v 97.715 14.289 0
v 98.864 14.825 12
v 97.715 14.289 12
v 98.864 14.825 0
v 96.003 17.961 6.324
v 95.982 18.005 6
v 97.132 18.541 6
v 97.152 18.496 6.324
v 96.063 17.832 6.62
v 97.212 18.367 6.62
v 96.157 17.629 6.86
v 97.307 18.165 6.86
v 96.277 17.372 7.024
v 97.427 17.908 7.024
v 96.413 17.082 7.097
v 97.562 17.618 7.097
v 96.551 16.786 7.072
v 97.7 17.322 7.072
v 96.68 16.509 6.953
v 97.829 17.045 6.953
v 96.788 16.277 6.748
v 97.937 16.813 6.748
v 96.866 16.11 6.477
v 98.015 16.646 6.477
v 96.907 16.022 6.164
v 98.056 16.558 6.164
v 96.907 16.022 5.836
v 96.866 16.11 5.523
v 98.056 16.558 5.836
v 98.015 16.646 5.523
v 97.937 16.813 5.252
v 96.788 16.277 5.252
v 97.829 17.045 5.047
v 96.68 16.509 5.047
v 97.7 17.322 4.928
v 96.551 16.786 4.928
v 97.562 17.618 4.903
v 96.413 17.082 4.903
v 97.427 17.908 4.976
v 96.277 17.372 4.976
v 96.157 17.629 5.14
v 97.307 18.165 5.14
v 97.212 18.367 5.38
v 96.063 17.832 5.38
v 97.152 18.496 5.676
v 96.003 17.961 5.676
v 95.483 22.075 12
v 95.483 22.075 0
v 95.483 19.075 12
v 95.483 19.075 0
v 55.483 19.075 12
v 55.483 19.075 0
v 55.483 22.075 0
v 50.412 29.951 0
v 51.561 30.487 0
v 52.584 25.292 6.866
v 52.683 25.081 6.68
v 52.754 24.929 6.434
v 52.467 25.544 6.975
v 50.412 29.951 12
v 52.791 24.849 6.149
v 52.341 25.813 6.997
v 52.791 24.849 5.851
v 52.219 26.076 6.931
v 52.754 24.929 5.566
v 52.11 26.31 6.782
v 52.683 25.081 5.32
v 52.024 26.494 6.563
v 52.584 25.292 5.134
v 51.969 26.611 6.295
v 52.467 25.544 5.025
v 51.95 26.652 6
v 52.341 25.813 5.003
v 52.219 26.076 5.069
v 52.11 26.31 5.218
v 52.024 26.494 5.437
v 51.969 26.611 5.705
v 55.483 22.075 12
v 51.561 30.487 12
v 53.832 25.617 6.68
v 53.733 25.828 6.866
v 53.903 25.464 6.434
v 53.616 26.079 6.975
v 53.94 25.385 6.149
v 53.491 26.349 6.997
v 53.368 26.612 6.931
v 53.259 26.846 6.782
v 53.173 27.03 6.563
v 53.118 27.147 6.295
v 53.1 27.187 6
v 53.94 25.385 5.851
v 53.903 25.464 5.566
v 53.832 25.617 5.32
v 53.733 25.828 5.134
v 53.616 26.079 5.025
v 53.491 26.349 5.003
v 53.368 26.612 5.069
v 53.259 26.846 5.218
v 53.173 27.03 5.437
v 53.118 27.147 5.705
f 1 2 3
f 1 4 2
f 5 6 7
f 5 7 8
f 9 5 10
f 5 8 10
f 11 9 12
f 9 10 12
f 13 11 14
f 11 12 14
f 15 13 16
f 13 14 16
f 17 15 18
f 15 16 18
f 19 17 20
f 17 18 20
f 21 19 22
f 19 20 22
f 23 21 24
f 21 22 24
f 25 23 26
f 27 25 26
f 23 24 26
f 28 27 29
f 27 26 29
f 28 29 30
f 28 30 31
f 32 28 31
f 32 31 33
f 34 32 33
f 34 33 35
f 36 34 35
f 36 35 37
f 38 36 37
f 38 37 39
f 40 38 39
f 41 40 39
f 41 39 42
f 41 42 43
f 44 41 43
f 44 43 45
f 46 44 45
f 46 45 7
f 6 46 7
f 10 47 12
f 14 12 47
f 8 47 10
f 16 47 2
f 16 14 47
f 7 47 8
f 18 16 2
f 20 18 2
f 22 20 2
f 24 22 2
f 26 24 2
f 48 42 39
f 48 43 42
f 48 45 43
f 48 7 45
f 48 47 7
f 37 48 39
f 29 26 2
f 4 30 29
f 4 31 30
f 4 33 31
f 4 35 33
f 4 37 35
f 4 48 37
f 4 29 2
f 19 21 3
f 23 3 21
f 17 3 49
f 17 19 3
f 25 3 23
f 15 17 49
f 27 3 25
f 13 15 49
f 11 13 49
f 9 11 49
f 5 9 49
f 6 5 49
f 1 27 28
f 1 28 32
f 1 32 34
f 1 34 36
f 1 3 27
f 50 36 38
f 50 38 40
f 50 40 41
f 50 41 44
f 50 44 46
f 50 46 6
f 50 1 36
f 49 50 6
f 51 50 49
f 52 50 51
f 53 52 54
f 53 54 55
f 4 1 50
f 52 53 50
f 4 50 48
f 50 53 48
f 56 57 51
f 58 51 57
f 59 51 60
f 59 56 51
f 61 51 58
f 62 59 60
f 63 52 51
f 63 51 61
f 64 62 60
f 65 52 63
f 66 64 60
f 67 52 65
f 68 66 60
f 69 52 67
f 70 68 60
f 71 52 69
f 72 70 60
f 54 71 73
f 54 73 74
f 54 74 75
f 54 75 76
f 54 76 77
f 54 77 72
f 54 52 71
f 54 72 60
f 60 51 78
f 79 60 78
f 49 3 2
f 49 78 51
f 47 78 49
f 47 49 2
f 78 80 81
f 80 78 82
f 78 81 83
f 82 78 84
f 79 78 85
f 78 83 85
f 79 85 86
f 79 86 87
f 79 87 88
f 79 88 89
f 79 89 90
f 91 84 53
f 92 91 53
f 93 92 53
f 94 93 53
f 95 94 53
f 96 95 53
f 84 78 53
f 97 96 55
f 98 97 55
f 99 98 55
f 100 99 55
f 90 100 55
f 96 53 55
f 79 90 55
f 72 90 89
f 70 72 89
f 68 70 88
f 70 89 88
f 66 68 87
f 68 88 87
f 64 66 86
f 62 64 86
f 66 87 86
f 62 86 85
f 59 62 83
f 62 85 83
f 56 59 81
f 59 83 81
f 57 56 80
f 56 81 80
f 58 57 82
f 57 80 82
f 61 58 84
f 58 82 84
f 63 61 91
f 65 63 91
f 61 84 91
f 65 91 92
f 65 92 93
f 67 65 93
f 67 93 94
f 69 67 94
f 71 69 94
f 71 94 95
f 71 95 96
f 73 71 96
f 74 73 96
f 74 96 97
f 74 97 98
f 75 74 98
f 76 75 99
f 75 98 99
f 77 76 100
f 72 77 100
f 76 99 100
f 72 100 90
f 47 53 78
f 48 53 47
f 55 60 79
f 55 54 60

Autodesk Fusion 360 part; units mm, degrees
sketch "Sketch1" plane through (0, 0, 0) normal (0, 0, 1) x (1, 0, 0)
  line L0 (55.4833, 22.0753) -> (95.4833, 22.0753)
  line L1 (95.4833, 22.0753) -> (95.4833, 19.0753)
  line L2 (95.4833, 19.0753) -> (55.4833, 19.0753)
  line L3 (55.4833, 19.0753) -> (55.4833, 22.0753)
  line L4 (95.4833, 22.0753) -> (98.8643, 14.8248)
  line L5 (98.8643, 14.8248) -> (97.7152, 14.289)
  line L6 (97.7152, 14.289) -> (95.4833, 19.0753)
  line L7 (55.4833, 19.0753) -> (50.4119, 29.951)
  line L8 (50.4119, 29.951) -> (51.561, 30.4868)
  line L9 (55.4833, 22.0753) -> (51.561, 30.4868)
  dimension "d2" = 3
  dimension "d3" = 40
  dimension "d5" = 115
  dimension "d8" = 115
  dimension "d9" = 115
  dimension "d10" = 115
  dimension "d12" = 8
  dimension "d13" = 12
extrude "Extrude1" add sketch "Sketch1" along normal blind 12
sketch "Sketch2" plane through (86.8847, 40.515, 0) normal (0.9063, 0.4226, 0) x (-0.4226, 0.9063, 0)
  line L0 (-28.346, 0) -> (-20.346, 0)
  line L1 (-20.346, 0) -> (-20.346, 12)
  line L2 (-20.346, 12) -> (-28.346, 12)
  line L3 (-28.346, 12) -> (-28.346, 0)
  line L4 (-25.346, 12) -> (-25.346, 0) construction
  line L5 (-20.346, 6) -> (-28.346, 6) construction
  circle A0 centre (-25.346, 6) radius 1.1
  dimension "d17" = 2.2
  dimension "d23" = 3
extrude "Extrude2" cut sketch "Sketch2" against normal up to surface (1.2679 mm away) contours A0
sketch "Sketch4" plane through (54.029, 25.1941, 0) normal (0.9063, 0.4226, 0) x (-0.4226, 0.9063, 0)
  line L0 (-3.4413, 0) -> (5.8398, 0)
  line L1 (5.8398, 0) -> (5.8398, 12)
  line L2 (5.8398, 12) -> (-3.4413, 12)
  line L3 (-3.4413, 12) -> (-3.4413, 0)
  line L4 (1.1993, 12) -> (1.1993, 0) construction
  line L5 (5.8398, 6) -> (-3.4413, 6) construction
  circle A0 centre (1.1993, 6) radius 1
  dimension "d24" = 2
extrude "Extrude3" cut sketch "Sketch4" against normal up to surface (1.2679 mm away) contours A0
equation "thickness = 3 mm"
equation "d2 = thickness"
equation "d3 = height"
equation "height = 40 mm"
